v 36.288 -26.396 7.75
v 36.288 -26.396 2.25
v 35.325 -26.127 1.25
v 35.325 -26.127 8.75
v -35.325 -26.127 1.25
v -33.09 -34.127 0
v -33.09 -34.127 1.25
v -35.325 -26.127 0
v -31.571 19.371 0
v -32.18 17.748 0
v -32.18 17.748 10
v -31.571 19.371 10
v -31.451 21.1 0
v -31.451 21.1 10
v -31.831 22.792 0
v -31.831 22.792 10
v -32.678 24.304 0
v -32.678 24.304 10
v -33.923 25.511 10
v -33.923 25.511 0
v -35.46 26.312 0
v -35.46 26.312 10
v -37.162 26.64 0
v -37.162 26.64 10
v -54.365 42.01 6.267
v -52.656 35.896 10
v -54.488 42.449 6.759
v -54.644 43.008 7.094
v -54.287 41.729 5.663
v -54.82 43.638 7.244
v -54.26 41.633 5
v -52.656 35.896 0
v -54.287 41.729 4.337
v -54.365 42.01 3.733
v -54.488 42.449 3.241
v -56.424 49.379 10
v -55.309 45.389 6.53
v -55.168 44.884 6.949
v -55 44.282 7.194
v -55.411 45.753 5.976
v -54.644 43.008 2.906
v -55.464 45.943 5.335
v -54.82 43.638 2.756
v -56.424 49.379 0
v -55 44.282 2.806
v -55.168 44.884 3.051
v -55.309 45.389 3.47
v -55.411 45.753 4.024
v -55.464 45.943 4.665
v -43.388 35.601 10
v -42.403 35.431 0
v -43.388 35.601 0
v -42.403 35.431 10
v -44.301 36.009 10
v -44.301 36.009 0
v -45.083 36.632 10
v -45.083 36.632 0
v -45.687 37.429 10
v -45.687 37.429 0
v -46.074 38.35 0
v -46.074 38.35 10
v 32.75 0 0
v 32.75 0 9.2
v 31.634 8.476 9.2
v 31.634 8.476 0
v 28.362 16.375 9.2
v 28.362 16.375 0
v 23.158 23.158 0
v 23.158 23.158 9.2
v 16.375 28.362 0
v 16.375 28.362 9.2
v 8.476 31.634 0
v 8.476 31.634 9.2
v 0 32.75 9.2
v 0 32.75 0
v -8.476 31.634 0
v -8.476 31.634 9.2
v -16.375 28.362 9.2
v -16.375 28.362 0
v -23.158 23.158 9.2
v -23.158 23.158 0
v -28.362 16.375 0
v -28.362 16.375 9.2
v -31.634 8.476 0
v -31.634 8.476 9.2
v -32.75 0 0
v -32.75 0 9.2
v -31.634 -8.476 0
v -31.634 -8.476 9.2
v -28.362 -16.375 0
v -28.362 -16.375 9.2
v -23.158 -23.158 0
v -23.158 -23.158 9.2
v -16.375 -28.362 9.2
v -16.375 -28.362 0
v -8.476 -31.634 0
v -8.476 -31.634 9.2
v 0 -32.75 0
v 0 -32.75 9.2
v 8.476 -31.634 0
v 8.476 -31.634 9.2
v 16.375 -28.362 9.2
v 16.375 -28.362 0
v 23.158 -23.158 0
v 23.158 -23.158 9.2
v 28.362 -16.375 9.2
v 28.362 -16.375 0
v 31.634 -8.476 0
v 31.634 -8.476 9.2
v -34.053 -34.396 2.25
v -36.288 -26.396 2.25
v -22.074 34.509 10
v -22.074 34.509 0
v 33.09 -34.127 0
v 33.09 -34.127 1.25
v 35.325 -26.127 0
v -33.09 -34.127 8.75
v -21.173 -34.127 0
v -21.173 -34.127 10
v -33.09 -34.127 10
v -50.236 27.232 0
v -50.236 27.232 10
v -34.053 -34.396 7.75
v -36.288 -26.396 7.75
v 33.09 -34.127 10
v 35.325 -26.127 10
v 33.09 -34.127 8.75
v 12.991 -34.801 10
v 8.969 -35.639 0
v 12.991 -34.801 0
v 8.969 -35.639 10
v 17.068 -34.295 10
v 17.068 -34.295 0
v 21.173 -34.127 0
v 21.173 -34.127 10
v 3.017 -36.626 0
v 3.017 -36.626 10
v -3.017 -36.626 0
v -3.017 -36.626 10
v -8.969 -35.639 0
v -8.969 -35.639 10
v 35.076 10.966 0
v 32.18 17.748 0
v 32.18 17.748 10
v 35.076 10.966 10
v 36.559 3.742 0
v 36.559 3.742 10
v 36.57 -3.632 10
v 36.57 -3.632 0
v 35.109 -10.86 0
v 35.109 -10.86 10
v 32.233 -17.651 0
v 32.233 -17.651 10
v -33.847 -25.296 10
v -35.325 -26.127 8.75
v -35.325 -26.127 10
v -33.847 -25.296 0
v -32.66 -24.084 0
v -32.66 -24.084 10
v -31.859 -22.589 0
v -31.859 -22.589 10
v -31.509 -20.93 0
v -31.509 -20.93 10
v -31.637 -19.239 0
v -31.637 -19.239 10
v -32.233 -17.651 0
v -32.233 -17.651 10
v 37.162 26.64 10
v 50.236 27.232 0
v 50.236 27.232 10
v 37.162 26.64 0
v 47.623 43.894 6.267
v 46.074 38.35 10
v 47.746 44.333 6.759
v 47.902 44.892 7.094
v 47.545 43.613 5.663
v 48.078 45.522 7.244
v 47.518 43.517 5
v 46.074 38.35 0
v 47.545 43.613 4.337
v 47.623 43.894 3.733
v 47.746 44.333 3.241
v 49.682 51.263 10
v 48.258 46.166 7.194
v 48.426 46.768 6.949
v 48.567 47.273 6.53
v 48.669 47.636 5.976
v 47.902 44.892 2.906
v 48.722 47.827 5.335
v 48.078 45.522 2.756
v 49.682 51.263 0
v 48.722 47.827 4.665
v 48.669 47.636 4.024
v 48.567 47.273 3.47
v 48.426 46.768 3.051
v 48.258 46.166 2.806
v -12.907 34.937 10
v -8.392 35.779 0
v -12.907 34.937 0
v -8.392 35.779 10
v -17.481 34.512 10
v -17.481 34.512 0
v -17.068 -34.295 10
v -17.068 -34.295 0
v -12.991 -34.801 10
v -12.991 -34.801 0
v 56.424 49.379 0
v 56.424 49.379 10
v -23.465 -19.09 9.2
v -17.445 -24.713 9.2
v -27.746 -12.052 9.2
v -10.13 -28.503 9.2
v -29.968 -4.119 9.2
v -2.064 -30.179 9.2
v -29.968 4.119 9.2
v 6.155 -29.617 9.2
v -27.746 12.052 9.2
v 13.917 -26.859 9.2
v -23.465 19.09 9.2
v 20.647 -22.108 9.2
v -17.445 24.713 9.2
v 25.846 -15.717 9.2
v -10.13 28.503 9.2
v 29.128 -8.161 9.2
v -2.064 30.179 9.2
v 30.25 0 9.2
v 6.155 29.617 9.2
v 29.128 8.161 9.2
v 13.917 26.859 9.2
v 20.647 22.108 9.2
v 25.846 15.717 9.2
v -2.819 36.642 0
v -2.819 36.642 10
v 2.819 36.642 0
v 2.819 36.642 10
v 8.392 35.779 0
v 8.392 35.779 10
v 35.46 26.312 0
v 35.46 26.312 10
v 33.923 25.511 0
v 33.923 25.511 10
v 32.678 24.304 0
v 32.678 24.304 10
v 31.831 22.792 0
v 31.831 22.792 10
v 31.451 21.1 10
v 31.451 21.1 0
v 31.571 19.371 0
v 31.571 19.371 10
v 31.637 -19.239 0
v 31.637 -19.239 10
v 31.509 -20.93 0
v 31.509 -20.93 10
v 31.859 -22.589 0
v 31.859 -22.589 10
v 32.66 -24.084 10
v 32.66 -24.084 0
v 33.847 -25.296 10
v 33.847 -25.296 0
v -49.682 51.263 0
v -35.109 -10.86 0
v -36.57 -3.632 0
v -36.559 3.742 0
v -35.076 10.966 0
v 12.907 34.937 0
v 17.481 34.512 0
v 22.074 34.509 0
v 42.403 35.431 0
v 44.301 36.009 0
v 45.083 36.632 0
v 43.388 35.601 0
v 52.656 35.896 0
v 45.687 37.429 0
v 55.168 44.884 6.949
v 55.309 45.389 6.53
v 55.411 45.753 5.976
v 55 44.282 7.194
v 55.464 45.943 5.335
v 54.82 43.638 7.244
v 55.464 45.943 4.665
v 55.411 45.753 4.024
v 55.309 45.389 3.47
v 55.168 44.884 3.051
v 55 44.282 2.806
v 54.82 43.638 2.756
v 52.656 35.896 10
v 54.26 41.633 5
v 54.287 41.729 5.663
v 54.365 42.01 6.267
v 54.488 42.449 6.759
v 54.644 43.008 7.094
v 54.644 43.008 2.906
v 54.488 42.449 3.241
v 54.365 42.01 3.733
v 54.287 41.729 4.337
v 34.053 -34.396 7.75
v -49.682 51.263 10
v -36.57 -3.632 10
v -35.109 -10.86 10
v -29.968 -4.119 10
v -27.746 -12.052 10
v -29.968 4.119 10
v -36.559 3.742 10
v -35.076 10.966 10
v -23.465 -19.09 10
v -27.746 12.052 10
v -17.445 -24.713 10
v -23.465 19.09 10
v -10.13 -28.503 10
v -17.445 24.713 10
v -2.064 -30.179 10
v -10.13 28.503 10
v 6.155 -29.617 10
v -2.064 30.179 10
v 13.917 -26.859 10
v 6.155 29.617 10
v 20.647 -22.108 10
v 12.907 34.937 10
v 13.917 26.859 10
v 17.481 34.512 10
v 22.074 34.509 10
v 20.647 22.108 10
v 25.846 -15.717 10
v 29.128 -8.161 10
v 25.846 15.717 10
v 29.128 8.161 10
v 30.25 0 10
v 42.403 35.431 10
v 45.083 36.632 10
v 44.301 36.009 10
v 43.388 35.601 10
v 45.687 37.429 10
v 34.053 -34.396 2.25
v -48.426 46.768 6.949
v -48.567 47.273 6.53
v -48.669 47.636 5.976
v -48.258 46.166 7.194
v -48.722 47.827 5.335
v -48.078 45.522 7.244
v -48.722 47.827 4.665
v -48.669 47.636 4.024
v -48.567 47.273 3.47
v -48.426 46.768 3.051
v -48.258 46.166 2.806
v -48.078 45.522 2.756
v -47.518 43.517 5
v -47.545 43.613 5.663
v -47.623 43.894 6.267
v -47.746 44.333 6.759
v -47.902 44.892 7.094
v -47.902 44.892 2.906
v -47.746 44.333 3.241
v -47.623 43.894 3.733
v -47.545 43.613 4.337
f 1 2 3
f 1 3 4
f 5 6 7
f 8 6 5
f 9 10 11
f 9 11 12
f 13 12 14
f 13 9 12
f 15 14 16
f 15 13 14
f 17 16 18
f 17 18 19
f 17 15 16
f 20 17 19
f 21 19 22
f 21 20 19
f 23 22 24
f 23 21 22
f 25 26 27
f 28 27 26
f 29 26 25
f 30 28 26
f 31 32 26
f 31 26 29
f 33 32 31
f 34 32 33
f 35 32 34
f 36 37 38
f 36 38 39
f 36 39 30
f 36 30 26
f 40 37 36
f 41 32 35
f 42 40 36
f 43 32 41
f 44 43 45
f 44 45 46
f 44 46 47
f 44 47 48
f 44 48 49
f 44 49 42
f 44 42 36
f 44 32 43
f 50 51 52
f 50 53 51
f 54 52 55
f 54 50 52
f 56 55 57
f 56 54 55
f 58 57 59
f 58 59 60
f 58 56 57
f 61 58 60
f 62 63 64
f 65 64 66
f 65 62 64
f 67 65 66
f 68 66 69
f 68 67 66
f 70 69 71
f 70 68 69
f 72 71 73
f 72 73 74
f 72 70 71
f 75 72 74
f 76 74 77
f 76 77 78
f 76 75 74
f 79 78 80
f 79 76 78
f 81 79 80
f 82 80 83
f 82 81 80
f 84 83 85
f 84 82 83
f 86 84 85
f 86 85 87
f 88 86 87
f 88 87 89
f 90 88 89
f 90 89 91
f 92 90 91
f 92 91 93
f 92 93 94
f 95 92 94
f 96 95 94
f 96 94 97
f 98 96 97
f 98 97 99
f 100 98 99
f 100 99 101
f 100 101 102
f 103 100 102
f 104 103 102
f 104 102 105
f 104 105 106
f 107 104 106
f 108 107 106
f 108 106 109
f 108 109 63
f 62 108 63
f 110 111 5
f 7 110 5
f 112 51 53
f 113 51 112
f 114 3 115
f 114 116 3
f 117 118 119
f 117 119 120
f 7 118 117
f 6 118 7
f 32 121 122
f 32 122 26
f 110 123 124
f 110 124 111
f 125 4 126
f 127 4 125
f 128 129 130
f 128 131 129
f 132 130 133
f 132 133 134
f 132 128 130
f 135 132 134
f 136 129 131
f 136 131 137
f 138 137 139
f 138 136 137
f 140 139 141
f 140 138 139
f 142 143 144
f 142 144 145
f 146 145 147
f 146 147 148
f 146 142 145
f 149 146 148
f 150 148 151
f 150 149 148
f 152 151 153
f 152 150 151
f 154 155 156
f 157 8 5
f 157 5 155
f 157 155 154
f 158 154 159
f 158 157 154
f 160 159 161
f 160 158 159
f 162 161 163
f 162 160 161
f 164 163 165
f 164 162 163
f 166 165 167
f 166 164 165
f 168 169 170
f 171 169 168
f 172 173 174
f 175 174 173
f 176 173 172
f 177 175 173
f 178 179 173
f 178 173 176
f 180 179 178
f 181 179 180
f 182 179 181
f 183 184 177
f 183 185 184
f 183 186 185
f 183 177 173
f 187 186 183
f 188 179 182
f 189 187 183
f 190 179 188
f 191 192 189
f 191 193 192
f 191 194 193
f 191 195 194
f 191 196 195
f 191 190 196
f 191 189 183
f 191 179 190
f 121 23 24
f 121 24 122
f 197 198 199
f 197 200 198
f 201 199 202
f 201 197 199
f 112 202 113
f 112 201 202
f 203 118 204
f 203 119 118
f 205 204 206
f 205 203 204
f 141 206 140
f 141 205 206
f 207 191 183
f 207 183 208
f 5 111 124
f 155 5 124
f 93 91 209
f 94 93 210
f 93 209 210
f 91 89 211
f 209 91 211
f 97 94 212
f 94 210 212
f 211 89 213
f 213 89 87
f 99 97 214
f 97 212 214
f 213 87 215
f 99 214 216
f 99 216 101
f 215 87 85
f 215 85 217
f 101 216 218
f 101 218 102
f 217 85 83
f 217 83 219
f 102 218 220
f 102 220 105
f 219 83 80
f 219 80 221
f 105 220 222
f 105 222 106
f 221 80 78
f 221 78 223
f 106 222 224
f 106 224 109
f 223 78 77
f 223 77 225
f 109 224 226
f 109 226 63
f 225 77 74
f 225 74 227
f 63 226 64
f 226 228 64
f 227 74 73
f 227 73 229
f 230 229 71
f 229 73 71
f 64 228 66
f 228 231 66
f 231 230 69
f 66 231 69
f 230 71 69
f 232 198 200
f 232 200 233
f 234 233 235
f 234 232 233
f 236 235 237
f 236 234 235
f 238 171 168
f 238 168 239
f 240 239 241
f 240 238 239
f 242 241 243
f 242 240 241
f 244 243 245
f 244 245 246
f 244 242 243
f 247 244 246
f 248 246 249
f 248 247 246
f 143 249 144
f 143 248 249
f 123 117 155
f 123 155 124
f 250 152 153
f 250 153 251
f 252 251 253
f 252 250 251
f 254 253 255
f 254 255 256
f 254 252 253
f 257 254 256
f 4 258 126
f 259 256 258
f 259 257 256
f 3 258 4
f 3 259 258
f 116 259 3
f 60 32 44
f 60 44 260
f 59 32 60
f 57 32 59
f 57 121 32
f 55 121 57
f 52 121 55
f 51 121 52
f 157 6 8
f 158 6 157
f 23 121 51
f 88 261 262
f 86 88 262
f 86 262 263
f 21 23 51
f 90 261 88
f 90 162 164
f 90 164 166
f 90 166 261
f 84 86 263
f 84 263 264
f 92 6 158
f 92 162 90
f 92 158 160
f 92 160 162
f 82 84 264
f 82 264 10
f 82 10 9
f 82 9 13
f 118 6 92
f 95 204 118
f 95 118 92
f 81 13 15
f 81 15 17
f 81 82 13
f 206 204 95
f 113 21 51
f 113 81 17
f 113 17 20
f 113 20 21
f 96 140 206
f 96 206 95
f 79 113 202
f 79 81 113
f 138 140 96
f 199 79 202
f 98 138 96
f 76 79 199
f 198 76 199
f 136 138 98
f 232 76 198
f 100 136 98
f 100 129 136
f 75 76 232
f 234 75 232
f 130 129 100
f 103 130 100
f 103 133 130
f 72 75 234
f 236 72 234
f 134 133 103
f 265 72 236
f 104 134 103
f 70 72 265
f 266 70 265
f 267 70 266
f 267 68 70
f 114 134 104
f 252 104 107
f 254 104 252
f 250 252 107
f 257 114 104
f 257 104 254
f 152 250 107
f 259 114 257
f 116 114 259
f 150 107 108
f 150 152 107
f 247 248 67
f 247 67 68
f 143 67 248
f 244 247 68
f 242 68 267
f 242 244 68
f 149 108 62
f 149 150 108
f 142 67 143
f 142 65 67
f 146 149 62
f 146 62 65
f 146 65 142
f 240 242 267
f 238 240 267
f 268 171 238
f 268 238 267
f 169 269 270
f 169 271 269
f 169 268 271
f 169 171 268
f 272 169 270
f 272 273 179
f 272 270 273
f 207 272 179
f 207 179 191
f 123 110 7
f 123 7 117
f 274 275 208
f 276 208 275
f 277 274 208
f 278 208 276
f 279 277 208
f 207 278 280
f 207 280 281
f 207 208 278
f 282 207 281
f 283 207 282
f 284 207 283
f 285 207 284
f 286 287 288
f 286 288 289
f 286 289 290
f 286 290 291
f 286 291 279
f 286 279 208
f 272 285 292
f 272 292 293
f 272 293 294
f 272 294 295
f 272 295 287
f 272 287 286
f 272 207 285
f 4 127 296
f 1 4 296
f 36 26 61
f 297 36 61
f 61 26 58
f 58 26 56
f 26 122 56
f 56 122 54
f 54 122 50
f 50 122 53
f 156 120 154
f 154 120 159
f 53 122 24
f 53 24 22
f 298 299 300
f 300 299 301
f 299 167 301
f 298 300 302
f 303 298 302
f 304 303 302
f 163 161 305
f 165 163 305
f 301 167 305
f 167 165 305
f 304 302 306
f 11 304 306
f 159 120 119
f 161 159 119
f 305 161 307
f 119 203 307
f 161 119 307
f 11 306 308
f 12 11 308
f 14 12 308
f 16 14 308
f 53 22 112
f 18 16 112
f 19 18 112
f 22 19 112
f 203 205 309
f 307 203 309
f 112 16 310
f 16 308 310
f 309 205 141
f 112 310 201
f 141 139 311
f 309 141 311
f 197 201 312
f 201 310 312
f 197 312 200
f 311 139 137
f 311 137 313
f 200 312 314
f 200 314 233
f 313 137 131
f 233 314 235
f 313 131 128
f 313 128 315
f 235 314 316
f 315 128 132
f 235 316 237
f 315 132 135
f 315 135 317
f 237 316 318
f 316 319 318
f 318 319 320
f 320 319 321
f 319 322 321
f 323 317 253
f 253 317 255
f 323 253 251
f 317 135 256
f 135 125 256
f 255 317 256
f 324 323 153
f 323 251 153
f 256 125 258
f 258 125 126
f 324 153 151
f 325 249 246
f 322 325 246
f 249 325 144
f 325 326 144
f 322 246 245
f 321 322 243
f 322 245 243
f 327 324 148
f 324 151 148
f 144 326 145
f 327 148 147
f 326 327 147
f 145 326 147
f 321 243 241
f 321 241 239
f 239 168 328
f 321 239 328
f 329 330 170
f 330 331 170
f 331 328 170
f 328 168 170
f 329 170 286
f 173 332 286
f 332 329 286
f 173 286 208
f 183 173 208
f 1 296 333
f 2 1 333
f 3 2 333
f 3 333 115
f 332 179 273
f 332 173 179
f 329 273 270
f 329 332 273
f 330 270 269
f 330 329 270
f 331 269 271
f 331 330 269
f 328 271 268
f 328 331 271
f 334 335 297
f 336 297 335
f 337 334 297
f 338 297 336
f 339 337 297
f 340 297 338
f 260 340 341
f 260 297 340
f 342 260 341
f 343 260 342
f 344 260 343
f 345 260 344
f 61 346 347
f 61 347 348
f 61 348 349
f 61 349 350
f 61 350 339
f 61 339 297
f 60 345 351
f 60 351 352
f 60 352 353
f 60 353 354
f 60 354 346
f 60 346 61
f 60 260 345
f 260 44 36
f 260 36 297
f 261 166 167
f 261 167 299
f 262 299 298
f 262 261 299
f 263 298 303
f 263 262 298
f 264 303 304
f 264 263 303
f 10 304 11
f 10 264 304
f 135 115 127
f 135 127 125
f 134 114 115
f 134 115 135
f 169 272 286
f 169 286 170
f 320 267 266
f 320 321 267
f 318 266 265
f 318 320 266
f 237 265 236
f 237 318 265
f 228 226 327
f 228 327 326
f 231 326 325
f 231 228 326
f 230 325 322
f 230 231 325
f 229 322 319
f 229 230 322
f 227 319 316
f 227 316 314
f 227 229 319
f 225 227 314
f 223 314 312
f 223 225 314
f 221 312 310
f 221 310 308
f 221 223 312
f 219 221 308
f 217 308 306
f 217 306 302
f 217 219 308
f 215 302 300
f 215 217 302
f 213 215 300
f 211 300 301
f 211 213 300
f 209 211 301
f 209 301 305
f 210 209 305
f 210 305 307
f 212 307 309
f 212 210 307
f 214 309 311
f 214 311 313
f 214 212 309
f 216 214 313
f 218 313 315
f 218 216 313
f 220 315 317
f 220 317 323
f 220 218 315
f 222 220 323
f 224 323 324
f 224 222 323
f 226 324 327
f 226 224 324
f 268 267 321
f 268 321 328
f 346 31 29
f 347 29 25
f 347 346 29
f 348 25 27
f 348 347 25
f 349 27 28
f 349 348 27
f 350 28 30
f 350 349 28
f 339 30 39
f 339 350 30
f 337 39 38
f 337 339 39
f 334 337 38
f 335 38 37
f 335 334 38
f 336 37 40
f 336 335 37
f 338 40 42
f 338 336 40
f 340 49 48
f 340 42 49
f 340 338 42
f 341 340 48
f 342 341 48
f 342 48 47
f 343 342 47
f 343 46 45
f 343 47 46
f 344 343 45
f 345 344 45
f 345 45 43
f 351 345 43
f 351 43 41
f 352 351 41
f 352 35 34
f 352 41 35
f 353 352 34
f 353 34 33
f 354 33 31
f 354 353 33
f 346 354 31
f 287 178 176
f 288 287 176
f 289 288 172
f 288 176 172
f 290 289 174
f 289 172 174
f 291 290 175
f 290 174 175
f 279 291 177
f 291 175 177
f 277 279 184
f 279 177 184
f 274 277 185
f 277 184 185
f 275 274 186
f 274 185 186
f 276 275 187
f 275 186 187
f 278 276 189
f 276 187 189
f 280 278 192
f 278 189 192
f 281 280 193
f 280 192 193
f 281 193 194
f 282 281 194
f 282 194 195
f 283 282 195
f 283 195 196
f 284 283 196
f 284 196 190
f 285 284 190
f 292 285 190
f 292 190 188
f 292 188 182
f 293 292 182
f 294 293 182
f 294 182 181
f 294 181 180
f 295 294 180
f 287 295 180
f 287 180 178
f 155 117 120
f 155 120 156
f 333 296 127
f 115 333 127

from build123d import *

# Parameters (mm, degrees)
SKIZZE1_R                       = 32.75
AUFSATZ_LINEAR_AUSTRAGEN1_DEPTH = 10
AUFSATZ_LINEAR_START            = -0.8
SKIZZE2_R                       = 32.75
SKIZZE2_R_2                     = 30.25
AUFSATZ_LINEAR_AUSTRAGEN2_DEPTH = 0.8
SKIZZE5_R                       = 2.25
SCHNITT_LINEAR_AUSTRAGEN1_DEPTH = 10
VERRUNDUNG1_R                   = 50
VERRUNDUNG2_R                   = 6
VERRUNDUNG3_R                   = 4
AUFSATZ_LINEAR_AUSTRAGEN3_DEPTH = 8.306468


with BuildPart() as part:
    # Skizze1 → Aufsatz-Linear austragen1 (new body)
    with BuildSketch(Plane.XY):
        with BuildLine():
            Line((-13.635878322, -34.12660725), (-33.089645956, -34.12660725))
            Line((-33.089645956, -34.12660725), (-35.325135331, -26.12660725))
            Line((-35.325135331, -26.12660725), (-25.844978112, -26.12660725))
            ThreePointArc((-25.844978112, -26.12660725), (-36.75, 0), (-25.844978112, 26.12660725))
            Line((-25.844978112, 26.12660725), (-50.235580292, 27.232429468))
            Line((-50.235580292, 27.232429468), (-52.656417654, 35.895722216))
            Line((-52.656417654, 35.895722216), (-56.424186432, 49.379190555))
            Line((-56.424186432, 49.379190555), (-49.682452262, 51.263074944))
            Line((-49.682452262, 51.263074944), (-45.294995525, 35.561969729))
            Line((-45.294995525, 35.561969729), (-13.635878322, 34.12660725))
            ThreePointArc((-13.635878322, 34.12660725), (0, 36.75), (13.635878322, 34.12660725))
            Line((13.635878322, 34.12660725), (45.294995525, 35.561969729))
            Line((45.294995525, 35.561969729), (49.682452262, 51.263074944))
            Line((49.682452262, 51.263074944), (56.424186432, 49.379190555))
            Line((56.424186432, 49.379190555), (52.656417654, 35.895722216))
            Line((52.656417654, 35.895722216), (50.235580292, 27.232429468))
            Line((50.235580292, 27.232429468), (25.844978112, 26.12660725))
            ThreePointArc((25.844978112, 26.12660725), (36.75, 0), (25.844978112, -26.12660725))
            Line((25.844978112, -26.12660725), (35.325135331, -26.12660725))
            Line((35.325135331, -26.12660725), (33.089645956, -34.12660725))
            Line((33.089645956, -34.12660725), (13.635878322, -34.12660725))
            ThreePointArc((13.635878322, -34.12660725), (0, -36.75), (-13.635878322, -34.12660725))
        make_face()
        Circle(SKIZZE1_R, mode=Mode.SUBTRACT)
    extrude(amount=AUFSATZ_LINEAR_AUSTRAGEN1_DEPTH)

    # Skizze2 → Aufsatz-Linear austragen2 (add)
    with BuildSketch(Plane.XY.offset(10).offset(AUFSATZ_LINEAR_START)):
        Circle(SKIZZE2_R)
        Circle(SKIZZE2_R_2, mode=Mode.SUBTRACT)
    extrude(amount=AUFSATZ_LINEAR_AUSTRAGEN2_DEPTH)

    # Skizze5 → Schnitt-Linear austragen1 (cut)
    with BuildSketch(Plane(origin=(32.796772797, -9.164604643, 0), x_dir=(0, 0, 1), z_dir=(-0.9631048813334842, 0.2691263412444341, 0))):
        with Locations(Location((5, 56.94978804, 0), (0, 0, 270))):
            Circle(SKIZZE5_R)
    schnitt_linear_austragen1 = extrude(amount=-SCHNITT_LINEAR_AUSTRAGEN1_DEPTH, mode=Mode.SUBTRACT)

    # Spiegeln1: Schnitt-Linear austragen1 across plane
    add(schnitt_linear_austragen1.mirror(Plane(origin=(0, 0, 0), x_dir=(0, 0, 1), z_dir=(1, 0, 0))), mode=Mode.SUBTRACT)

    # Verrundung1
    verrundung1_edges = [part.edges().sort_by_distance(p)[0] for p in [
        (13.635878322, 34.12660725, 5),
        (13.635878322, -34.12660725, 5),
        (-13.635878322, -34.12660725, 5),
        (-13.635878322, 34.12660725, 5),
    ]]
    fillet(verrundung1_edges, radius=VERRUNDUNG1_R)

    # Verrundung2
    # the kernel refuses this fillet: 6 mm, written as the material it adds along each edge
    with BuildSketch(Plane(origin=(-25.844978112, -26.12660725, 0), x_dir=(-1, 0, 0), z_dir=(0, 0, 1))) as verrundung2_piece_1:
        with BuildLine():
            CenterArc((11.651069987, -5.593490659), VERRUNDUNG2_R, 111.211936516, 97.493506366)
            Line((6.388466745, -8.475331584), (6.283214681, -8.532968403))
            ThreePointArc((6.283214681, -8.532968403), (3.405977683, -4.078058883), (-0.084391765, -0.085311371))
            Line((-0.084391765, -0.085311371), (0, 0.12))
            ThreePointArc((0, 0.12), (4.74007861, 0.12), (9.436738964, 0.111869813))
            Line((9.436738964, 0.111869813), (9.48015722, 0))
        make_face()
    extrude(amount=10)
    with BuildSketch(Plane(origin=(25.844978112, -26.12660725, 0), x_dir=(1, 0, 0), z_dir=(0, 0, 1))) as verrundung2_piece_2:
        with BuildLine():
            CenterArc((11.651069987, 5.593490659), VERRUNDUNG2_R, 151.294557118, 97.493506366)
            Line((6.388466745, 8.475331584), (6.283214681, 8.532968403))
            ThreePointArc((6.283214681, 8.532968403), (3.405977683, 4.078058883), (-0.084391765, 0.085311371))
            Line((-0.084391765, 0.085311371), (0, -0.12))
            ThreePointArc((0, -0.12), (4.74007861, -0.12), (9.436738964, -0.111869813))
            Line((9.436738964, -0.111869813), (9.48015722, 0))
        make_face()
    extrude(amount=10)
    with BuildSketch(Plane(origin=(25.844978112, 26.12660725, 0), x_dir=(0.603126946859045, -0.7976452130944475, 0), z_dir=(0, 0, 1))) as verrundung2_piece_3:
        with BuildLine():
            CenterArc((11.361383868, 5.938413704), VERRUNDUNG2_R, 145.501722428, 116.281978681)
            Line((6.416524574, 9.336702474), (6.317627388, 9.40466825))
            Line((6.317627388, 9.40466825), (-0.098897186, 0.067965775))
            Line((-0.098897186, 0.067965775), (0.017149259, -0.118768274))
            ThreePointArc((0.017149259, -0.118768274), (5.251960467, 0.257216064), (10.486771676, -0.118768274))
            Line((10.486771676, -0.118768274), (10.503920934, 0))
        make_face()
    extrude(amount=10)
    with BuildSketch(Plane(origin=(-25.844978112, 26.12660725, 0), x_dir=(-0.6031269468590452, -0.7976452130944475, 0), z_dir=(0, 0, 1))) as verrundung2_piece_4:
        with BuildLine():
            CenterArc((11.361383868, -5.938413704), VERRUNDUNG2_R, 98.216298891, 116.281978681)
            Line((6.416524574, -9.336702474), (6.317627388, -9.40466825))
            Line((6.317627388, -9.40466825), (-0.098897186, -0.067965775))
            Line((-0.098897186, -0.067965775), (0.017149259, 0.118768274))
            ThreePointArc((0.017149259, 0.118768274), (5.251960467, -0.257216064), (10.486771676, 0.118768274))
            Line((10.486771676, 0.118768274), (10.503920934, 0))
        make_face()
    extrude(amount=10)

    # Verrundung3
    verrundung3_edges = [part.edges().sort_by_distance(p)[0] for p in [
        (45.294995525, 35.561969729, 5),
        (-45.294995525, 35.561969729, 5),
    ]]
    fillet(verrundung3_edges, radius=VERRUNDUNG3_R)

    # Skizze6 → Aufsatz-Linear austragen3 (add)
    with BuildSketch(Plane(origin=(6.448861011, -23.078118218, 0), x_dir=(0, 0, -1), z_dir=(-0.26912634124443396, 0.9631048813334842, 0))):
        Polygon((-8.75, 41.05316849), (-7.75, 42.05316849), (-2.25, 42.05316849), (-1.25, 41.05316849), align=None)
    aufsatz_linear_austragen3 = extrude(amount=AUFSATZ_LINEAR_AUSTRAGEN3_DEPTH)

    # Spiegeln2: Aufsatz-Linear austragen3 across plane
    add(aufsatz_linear_austragen3.mirror(Plane(origin=(0, 0, 0), x_dir=(0, 0, 1), z_dir=(1, 0, 0))))


solid = part.part
